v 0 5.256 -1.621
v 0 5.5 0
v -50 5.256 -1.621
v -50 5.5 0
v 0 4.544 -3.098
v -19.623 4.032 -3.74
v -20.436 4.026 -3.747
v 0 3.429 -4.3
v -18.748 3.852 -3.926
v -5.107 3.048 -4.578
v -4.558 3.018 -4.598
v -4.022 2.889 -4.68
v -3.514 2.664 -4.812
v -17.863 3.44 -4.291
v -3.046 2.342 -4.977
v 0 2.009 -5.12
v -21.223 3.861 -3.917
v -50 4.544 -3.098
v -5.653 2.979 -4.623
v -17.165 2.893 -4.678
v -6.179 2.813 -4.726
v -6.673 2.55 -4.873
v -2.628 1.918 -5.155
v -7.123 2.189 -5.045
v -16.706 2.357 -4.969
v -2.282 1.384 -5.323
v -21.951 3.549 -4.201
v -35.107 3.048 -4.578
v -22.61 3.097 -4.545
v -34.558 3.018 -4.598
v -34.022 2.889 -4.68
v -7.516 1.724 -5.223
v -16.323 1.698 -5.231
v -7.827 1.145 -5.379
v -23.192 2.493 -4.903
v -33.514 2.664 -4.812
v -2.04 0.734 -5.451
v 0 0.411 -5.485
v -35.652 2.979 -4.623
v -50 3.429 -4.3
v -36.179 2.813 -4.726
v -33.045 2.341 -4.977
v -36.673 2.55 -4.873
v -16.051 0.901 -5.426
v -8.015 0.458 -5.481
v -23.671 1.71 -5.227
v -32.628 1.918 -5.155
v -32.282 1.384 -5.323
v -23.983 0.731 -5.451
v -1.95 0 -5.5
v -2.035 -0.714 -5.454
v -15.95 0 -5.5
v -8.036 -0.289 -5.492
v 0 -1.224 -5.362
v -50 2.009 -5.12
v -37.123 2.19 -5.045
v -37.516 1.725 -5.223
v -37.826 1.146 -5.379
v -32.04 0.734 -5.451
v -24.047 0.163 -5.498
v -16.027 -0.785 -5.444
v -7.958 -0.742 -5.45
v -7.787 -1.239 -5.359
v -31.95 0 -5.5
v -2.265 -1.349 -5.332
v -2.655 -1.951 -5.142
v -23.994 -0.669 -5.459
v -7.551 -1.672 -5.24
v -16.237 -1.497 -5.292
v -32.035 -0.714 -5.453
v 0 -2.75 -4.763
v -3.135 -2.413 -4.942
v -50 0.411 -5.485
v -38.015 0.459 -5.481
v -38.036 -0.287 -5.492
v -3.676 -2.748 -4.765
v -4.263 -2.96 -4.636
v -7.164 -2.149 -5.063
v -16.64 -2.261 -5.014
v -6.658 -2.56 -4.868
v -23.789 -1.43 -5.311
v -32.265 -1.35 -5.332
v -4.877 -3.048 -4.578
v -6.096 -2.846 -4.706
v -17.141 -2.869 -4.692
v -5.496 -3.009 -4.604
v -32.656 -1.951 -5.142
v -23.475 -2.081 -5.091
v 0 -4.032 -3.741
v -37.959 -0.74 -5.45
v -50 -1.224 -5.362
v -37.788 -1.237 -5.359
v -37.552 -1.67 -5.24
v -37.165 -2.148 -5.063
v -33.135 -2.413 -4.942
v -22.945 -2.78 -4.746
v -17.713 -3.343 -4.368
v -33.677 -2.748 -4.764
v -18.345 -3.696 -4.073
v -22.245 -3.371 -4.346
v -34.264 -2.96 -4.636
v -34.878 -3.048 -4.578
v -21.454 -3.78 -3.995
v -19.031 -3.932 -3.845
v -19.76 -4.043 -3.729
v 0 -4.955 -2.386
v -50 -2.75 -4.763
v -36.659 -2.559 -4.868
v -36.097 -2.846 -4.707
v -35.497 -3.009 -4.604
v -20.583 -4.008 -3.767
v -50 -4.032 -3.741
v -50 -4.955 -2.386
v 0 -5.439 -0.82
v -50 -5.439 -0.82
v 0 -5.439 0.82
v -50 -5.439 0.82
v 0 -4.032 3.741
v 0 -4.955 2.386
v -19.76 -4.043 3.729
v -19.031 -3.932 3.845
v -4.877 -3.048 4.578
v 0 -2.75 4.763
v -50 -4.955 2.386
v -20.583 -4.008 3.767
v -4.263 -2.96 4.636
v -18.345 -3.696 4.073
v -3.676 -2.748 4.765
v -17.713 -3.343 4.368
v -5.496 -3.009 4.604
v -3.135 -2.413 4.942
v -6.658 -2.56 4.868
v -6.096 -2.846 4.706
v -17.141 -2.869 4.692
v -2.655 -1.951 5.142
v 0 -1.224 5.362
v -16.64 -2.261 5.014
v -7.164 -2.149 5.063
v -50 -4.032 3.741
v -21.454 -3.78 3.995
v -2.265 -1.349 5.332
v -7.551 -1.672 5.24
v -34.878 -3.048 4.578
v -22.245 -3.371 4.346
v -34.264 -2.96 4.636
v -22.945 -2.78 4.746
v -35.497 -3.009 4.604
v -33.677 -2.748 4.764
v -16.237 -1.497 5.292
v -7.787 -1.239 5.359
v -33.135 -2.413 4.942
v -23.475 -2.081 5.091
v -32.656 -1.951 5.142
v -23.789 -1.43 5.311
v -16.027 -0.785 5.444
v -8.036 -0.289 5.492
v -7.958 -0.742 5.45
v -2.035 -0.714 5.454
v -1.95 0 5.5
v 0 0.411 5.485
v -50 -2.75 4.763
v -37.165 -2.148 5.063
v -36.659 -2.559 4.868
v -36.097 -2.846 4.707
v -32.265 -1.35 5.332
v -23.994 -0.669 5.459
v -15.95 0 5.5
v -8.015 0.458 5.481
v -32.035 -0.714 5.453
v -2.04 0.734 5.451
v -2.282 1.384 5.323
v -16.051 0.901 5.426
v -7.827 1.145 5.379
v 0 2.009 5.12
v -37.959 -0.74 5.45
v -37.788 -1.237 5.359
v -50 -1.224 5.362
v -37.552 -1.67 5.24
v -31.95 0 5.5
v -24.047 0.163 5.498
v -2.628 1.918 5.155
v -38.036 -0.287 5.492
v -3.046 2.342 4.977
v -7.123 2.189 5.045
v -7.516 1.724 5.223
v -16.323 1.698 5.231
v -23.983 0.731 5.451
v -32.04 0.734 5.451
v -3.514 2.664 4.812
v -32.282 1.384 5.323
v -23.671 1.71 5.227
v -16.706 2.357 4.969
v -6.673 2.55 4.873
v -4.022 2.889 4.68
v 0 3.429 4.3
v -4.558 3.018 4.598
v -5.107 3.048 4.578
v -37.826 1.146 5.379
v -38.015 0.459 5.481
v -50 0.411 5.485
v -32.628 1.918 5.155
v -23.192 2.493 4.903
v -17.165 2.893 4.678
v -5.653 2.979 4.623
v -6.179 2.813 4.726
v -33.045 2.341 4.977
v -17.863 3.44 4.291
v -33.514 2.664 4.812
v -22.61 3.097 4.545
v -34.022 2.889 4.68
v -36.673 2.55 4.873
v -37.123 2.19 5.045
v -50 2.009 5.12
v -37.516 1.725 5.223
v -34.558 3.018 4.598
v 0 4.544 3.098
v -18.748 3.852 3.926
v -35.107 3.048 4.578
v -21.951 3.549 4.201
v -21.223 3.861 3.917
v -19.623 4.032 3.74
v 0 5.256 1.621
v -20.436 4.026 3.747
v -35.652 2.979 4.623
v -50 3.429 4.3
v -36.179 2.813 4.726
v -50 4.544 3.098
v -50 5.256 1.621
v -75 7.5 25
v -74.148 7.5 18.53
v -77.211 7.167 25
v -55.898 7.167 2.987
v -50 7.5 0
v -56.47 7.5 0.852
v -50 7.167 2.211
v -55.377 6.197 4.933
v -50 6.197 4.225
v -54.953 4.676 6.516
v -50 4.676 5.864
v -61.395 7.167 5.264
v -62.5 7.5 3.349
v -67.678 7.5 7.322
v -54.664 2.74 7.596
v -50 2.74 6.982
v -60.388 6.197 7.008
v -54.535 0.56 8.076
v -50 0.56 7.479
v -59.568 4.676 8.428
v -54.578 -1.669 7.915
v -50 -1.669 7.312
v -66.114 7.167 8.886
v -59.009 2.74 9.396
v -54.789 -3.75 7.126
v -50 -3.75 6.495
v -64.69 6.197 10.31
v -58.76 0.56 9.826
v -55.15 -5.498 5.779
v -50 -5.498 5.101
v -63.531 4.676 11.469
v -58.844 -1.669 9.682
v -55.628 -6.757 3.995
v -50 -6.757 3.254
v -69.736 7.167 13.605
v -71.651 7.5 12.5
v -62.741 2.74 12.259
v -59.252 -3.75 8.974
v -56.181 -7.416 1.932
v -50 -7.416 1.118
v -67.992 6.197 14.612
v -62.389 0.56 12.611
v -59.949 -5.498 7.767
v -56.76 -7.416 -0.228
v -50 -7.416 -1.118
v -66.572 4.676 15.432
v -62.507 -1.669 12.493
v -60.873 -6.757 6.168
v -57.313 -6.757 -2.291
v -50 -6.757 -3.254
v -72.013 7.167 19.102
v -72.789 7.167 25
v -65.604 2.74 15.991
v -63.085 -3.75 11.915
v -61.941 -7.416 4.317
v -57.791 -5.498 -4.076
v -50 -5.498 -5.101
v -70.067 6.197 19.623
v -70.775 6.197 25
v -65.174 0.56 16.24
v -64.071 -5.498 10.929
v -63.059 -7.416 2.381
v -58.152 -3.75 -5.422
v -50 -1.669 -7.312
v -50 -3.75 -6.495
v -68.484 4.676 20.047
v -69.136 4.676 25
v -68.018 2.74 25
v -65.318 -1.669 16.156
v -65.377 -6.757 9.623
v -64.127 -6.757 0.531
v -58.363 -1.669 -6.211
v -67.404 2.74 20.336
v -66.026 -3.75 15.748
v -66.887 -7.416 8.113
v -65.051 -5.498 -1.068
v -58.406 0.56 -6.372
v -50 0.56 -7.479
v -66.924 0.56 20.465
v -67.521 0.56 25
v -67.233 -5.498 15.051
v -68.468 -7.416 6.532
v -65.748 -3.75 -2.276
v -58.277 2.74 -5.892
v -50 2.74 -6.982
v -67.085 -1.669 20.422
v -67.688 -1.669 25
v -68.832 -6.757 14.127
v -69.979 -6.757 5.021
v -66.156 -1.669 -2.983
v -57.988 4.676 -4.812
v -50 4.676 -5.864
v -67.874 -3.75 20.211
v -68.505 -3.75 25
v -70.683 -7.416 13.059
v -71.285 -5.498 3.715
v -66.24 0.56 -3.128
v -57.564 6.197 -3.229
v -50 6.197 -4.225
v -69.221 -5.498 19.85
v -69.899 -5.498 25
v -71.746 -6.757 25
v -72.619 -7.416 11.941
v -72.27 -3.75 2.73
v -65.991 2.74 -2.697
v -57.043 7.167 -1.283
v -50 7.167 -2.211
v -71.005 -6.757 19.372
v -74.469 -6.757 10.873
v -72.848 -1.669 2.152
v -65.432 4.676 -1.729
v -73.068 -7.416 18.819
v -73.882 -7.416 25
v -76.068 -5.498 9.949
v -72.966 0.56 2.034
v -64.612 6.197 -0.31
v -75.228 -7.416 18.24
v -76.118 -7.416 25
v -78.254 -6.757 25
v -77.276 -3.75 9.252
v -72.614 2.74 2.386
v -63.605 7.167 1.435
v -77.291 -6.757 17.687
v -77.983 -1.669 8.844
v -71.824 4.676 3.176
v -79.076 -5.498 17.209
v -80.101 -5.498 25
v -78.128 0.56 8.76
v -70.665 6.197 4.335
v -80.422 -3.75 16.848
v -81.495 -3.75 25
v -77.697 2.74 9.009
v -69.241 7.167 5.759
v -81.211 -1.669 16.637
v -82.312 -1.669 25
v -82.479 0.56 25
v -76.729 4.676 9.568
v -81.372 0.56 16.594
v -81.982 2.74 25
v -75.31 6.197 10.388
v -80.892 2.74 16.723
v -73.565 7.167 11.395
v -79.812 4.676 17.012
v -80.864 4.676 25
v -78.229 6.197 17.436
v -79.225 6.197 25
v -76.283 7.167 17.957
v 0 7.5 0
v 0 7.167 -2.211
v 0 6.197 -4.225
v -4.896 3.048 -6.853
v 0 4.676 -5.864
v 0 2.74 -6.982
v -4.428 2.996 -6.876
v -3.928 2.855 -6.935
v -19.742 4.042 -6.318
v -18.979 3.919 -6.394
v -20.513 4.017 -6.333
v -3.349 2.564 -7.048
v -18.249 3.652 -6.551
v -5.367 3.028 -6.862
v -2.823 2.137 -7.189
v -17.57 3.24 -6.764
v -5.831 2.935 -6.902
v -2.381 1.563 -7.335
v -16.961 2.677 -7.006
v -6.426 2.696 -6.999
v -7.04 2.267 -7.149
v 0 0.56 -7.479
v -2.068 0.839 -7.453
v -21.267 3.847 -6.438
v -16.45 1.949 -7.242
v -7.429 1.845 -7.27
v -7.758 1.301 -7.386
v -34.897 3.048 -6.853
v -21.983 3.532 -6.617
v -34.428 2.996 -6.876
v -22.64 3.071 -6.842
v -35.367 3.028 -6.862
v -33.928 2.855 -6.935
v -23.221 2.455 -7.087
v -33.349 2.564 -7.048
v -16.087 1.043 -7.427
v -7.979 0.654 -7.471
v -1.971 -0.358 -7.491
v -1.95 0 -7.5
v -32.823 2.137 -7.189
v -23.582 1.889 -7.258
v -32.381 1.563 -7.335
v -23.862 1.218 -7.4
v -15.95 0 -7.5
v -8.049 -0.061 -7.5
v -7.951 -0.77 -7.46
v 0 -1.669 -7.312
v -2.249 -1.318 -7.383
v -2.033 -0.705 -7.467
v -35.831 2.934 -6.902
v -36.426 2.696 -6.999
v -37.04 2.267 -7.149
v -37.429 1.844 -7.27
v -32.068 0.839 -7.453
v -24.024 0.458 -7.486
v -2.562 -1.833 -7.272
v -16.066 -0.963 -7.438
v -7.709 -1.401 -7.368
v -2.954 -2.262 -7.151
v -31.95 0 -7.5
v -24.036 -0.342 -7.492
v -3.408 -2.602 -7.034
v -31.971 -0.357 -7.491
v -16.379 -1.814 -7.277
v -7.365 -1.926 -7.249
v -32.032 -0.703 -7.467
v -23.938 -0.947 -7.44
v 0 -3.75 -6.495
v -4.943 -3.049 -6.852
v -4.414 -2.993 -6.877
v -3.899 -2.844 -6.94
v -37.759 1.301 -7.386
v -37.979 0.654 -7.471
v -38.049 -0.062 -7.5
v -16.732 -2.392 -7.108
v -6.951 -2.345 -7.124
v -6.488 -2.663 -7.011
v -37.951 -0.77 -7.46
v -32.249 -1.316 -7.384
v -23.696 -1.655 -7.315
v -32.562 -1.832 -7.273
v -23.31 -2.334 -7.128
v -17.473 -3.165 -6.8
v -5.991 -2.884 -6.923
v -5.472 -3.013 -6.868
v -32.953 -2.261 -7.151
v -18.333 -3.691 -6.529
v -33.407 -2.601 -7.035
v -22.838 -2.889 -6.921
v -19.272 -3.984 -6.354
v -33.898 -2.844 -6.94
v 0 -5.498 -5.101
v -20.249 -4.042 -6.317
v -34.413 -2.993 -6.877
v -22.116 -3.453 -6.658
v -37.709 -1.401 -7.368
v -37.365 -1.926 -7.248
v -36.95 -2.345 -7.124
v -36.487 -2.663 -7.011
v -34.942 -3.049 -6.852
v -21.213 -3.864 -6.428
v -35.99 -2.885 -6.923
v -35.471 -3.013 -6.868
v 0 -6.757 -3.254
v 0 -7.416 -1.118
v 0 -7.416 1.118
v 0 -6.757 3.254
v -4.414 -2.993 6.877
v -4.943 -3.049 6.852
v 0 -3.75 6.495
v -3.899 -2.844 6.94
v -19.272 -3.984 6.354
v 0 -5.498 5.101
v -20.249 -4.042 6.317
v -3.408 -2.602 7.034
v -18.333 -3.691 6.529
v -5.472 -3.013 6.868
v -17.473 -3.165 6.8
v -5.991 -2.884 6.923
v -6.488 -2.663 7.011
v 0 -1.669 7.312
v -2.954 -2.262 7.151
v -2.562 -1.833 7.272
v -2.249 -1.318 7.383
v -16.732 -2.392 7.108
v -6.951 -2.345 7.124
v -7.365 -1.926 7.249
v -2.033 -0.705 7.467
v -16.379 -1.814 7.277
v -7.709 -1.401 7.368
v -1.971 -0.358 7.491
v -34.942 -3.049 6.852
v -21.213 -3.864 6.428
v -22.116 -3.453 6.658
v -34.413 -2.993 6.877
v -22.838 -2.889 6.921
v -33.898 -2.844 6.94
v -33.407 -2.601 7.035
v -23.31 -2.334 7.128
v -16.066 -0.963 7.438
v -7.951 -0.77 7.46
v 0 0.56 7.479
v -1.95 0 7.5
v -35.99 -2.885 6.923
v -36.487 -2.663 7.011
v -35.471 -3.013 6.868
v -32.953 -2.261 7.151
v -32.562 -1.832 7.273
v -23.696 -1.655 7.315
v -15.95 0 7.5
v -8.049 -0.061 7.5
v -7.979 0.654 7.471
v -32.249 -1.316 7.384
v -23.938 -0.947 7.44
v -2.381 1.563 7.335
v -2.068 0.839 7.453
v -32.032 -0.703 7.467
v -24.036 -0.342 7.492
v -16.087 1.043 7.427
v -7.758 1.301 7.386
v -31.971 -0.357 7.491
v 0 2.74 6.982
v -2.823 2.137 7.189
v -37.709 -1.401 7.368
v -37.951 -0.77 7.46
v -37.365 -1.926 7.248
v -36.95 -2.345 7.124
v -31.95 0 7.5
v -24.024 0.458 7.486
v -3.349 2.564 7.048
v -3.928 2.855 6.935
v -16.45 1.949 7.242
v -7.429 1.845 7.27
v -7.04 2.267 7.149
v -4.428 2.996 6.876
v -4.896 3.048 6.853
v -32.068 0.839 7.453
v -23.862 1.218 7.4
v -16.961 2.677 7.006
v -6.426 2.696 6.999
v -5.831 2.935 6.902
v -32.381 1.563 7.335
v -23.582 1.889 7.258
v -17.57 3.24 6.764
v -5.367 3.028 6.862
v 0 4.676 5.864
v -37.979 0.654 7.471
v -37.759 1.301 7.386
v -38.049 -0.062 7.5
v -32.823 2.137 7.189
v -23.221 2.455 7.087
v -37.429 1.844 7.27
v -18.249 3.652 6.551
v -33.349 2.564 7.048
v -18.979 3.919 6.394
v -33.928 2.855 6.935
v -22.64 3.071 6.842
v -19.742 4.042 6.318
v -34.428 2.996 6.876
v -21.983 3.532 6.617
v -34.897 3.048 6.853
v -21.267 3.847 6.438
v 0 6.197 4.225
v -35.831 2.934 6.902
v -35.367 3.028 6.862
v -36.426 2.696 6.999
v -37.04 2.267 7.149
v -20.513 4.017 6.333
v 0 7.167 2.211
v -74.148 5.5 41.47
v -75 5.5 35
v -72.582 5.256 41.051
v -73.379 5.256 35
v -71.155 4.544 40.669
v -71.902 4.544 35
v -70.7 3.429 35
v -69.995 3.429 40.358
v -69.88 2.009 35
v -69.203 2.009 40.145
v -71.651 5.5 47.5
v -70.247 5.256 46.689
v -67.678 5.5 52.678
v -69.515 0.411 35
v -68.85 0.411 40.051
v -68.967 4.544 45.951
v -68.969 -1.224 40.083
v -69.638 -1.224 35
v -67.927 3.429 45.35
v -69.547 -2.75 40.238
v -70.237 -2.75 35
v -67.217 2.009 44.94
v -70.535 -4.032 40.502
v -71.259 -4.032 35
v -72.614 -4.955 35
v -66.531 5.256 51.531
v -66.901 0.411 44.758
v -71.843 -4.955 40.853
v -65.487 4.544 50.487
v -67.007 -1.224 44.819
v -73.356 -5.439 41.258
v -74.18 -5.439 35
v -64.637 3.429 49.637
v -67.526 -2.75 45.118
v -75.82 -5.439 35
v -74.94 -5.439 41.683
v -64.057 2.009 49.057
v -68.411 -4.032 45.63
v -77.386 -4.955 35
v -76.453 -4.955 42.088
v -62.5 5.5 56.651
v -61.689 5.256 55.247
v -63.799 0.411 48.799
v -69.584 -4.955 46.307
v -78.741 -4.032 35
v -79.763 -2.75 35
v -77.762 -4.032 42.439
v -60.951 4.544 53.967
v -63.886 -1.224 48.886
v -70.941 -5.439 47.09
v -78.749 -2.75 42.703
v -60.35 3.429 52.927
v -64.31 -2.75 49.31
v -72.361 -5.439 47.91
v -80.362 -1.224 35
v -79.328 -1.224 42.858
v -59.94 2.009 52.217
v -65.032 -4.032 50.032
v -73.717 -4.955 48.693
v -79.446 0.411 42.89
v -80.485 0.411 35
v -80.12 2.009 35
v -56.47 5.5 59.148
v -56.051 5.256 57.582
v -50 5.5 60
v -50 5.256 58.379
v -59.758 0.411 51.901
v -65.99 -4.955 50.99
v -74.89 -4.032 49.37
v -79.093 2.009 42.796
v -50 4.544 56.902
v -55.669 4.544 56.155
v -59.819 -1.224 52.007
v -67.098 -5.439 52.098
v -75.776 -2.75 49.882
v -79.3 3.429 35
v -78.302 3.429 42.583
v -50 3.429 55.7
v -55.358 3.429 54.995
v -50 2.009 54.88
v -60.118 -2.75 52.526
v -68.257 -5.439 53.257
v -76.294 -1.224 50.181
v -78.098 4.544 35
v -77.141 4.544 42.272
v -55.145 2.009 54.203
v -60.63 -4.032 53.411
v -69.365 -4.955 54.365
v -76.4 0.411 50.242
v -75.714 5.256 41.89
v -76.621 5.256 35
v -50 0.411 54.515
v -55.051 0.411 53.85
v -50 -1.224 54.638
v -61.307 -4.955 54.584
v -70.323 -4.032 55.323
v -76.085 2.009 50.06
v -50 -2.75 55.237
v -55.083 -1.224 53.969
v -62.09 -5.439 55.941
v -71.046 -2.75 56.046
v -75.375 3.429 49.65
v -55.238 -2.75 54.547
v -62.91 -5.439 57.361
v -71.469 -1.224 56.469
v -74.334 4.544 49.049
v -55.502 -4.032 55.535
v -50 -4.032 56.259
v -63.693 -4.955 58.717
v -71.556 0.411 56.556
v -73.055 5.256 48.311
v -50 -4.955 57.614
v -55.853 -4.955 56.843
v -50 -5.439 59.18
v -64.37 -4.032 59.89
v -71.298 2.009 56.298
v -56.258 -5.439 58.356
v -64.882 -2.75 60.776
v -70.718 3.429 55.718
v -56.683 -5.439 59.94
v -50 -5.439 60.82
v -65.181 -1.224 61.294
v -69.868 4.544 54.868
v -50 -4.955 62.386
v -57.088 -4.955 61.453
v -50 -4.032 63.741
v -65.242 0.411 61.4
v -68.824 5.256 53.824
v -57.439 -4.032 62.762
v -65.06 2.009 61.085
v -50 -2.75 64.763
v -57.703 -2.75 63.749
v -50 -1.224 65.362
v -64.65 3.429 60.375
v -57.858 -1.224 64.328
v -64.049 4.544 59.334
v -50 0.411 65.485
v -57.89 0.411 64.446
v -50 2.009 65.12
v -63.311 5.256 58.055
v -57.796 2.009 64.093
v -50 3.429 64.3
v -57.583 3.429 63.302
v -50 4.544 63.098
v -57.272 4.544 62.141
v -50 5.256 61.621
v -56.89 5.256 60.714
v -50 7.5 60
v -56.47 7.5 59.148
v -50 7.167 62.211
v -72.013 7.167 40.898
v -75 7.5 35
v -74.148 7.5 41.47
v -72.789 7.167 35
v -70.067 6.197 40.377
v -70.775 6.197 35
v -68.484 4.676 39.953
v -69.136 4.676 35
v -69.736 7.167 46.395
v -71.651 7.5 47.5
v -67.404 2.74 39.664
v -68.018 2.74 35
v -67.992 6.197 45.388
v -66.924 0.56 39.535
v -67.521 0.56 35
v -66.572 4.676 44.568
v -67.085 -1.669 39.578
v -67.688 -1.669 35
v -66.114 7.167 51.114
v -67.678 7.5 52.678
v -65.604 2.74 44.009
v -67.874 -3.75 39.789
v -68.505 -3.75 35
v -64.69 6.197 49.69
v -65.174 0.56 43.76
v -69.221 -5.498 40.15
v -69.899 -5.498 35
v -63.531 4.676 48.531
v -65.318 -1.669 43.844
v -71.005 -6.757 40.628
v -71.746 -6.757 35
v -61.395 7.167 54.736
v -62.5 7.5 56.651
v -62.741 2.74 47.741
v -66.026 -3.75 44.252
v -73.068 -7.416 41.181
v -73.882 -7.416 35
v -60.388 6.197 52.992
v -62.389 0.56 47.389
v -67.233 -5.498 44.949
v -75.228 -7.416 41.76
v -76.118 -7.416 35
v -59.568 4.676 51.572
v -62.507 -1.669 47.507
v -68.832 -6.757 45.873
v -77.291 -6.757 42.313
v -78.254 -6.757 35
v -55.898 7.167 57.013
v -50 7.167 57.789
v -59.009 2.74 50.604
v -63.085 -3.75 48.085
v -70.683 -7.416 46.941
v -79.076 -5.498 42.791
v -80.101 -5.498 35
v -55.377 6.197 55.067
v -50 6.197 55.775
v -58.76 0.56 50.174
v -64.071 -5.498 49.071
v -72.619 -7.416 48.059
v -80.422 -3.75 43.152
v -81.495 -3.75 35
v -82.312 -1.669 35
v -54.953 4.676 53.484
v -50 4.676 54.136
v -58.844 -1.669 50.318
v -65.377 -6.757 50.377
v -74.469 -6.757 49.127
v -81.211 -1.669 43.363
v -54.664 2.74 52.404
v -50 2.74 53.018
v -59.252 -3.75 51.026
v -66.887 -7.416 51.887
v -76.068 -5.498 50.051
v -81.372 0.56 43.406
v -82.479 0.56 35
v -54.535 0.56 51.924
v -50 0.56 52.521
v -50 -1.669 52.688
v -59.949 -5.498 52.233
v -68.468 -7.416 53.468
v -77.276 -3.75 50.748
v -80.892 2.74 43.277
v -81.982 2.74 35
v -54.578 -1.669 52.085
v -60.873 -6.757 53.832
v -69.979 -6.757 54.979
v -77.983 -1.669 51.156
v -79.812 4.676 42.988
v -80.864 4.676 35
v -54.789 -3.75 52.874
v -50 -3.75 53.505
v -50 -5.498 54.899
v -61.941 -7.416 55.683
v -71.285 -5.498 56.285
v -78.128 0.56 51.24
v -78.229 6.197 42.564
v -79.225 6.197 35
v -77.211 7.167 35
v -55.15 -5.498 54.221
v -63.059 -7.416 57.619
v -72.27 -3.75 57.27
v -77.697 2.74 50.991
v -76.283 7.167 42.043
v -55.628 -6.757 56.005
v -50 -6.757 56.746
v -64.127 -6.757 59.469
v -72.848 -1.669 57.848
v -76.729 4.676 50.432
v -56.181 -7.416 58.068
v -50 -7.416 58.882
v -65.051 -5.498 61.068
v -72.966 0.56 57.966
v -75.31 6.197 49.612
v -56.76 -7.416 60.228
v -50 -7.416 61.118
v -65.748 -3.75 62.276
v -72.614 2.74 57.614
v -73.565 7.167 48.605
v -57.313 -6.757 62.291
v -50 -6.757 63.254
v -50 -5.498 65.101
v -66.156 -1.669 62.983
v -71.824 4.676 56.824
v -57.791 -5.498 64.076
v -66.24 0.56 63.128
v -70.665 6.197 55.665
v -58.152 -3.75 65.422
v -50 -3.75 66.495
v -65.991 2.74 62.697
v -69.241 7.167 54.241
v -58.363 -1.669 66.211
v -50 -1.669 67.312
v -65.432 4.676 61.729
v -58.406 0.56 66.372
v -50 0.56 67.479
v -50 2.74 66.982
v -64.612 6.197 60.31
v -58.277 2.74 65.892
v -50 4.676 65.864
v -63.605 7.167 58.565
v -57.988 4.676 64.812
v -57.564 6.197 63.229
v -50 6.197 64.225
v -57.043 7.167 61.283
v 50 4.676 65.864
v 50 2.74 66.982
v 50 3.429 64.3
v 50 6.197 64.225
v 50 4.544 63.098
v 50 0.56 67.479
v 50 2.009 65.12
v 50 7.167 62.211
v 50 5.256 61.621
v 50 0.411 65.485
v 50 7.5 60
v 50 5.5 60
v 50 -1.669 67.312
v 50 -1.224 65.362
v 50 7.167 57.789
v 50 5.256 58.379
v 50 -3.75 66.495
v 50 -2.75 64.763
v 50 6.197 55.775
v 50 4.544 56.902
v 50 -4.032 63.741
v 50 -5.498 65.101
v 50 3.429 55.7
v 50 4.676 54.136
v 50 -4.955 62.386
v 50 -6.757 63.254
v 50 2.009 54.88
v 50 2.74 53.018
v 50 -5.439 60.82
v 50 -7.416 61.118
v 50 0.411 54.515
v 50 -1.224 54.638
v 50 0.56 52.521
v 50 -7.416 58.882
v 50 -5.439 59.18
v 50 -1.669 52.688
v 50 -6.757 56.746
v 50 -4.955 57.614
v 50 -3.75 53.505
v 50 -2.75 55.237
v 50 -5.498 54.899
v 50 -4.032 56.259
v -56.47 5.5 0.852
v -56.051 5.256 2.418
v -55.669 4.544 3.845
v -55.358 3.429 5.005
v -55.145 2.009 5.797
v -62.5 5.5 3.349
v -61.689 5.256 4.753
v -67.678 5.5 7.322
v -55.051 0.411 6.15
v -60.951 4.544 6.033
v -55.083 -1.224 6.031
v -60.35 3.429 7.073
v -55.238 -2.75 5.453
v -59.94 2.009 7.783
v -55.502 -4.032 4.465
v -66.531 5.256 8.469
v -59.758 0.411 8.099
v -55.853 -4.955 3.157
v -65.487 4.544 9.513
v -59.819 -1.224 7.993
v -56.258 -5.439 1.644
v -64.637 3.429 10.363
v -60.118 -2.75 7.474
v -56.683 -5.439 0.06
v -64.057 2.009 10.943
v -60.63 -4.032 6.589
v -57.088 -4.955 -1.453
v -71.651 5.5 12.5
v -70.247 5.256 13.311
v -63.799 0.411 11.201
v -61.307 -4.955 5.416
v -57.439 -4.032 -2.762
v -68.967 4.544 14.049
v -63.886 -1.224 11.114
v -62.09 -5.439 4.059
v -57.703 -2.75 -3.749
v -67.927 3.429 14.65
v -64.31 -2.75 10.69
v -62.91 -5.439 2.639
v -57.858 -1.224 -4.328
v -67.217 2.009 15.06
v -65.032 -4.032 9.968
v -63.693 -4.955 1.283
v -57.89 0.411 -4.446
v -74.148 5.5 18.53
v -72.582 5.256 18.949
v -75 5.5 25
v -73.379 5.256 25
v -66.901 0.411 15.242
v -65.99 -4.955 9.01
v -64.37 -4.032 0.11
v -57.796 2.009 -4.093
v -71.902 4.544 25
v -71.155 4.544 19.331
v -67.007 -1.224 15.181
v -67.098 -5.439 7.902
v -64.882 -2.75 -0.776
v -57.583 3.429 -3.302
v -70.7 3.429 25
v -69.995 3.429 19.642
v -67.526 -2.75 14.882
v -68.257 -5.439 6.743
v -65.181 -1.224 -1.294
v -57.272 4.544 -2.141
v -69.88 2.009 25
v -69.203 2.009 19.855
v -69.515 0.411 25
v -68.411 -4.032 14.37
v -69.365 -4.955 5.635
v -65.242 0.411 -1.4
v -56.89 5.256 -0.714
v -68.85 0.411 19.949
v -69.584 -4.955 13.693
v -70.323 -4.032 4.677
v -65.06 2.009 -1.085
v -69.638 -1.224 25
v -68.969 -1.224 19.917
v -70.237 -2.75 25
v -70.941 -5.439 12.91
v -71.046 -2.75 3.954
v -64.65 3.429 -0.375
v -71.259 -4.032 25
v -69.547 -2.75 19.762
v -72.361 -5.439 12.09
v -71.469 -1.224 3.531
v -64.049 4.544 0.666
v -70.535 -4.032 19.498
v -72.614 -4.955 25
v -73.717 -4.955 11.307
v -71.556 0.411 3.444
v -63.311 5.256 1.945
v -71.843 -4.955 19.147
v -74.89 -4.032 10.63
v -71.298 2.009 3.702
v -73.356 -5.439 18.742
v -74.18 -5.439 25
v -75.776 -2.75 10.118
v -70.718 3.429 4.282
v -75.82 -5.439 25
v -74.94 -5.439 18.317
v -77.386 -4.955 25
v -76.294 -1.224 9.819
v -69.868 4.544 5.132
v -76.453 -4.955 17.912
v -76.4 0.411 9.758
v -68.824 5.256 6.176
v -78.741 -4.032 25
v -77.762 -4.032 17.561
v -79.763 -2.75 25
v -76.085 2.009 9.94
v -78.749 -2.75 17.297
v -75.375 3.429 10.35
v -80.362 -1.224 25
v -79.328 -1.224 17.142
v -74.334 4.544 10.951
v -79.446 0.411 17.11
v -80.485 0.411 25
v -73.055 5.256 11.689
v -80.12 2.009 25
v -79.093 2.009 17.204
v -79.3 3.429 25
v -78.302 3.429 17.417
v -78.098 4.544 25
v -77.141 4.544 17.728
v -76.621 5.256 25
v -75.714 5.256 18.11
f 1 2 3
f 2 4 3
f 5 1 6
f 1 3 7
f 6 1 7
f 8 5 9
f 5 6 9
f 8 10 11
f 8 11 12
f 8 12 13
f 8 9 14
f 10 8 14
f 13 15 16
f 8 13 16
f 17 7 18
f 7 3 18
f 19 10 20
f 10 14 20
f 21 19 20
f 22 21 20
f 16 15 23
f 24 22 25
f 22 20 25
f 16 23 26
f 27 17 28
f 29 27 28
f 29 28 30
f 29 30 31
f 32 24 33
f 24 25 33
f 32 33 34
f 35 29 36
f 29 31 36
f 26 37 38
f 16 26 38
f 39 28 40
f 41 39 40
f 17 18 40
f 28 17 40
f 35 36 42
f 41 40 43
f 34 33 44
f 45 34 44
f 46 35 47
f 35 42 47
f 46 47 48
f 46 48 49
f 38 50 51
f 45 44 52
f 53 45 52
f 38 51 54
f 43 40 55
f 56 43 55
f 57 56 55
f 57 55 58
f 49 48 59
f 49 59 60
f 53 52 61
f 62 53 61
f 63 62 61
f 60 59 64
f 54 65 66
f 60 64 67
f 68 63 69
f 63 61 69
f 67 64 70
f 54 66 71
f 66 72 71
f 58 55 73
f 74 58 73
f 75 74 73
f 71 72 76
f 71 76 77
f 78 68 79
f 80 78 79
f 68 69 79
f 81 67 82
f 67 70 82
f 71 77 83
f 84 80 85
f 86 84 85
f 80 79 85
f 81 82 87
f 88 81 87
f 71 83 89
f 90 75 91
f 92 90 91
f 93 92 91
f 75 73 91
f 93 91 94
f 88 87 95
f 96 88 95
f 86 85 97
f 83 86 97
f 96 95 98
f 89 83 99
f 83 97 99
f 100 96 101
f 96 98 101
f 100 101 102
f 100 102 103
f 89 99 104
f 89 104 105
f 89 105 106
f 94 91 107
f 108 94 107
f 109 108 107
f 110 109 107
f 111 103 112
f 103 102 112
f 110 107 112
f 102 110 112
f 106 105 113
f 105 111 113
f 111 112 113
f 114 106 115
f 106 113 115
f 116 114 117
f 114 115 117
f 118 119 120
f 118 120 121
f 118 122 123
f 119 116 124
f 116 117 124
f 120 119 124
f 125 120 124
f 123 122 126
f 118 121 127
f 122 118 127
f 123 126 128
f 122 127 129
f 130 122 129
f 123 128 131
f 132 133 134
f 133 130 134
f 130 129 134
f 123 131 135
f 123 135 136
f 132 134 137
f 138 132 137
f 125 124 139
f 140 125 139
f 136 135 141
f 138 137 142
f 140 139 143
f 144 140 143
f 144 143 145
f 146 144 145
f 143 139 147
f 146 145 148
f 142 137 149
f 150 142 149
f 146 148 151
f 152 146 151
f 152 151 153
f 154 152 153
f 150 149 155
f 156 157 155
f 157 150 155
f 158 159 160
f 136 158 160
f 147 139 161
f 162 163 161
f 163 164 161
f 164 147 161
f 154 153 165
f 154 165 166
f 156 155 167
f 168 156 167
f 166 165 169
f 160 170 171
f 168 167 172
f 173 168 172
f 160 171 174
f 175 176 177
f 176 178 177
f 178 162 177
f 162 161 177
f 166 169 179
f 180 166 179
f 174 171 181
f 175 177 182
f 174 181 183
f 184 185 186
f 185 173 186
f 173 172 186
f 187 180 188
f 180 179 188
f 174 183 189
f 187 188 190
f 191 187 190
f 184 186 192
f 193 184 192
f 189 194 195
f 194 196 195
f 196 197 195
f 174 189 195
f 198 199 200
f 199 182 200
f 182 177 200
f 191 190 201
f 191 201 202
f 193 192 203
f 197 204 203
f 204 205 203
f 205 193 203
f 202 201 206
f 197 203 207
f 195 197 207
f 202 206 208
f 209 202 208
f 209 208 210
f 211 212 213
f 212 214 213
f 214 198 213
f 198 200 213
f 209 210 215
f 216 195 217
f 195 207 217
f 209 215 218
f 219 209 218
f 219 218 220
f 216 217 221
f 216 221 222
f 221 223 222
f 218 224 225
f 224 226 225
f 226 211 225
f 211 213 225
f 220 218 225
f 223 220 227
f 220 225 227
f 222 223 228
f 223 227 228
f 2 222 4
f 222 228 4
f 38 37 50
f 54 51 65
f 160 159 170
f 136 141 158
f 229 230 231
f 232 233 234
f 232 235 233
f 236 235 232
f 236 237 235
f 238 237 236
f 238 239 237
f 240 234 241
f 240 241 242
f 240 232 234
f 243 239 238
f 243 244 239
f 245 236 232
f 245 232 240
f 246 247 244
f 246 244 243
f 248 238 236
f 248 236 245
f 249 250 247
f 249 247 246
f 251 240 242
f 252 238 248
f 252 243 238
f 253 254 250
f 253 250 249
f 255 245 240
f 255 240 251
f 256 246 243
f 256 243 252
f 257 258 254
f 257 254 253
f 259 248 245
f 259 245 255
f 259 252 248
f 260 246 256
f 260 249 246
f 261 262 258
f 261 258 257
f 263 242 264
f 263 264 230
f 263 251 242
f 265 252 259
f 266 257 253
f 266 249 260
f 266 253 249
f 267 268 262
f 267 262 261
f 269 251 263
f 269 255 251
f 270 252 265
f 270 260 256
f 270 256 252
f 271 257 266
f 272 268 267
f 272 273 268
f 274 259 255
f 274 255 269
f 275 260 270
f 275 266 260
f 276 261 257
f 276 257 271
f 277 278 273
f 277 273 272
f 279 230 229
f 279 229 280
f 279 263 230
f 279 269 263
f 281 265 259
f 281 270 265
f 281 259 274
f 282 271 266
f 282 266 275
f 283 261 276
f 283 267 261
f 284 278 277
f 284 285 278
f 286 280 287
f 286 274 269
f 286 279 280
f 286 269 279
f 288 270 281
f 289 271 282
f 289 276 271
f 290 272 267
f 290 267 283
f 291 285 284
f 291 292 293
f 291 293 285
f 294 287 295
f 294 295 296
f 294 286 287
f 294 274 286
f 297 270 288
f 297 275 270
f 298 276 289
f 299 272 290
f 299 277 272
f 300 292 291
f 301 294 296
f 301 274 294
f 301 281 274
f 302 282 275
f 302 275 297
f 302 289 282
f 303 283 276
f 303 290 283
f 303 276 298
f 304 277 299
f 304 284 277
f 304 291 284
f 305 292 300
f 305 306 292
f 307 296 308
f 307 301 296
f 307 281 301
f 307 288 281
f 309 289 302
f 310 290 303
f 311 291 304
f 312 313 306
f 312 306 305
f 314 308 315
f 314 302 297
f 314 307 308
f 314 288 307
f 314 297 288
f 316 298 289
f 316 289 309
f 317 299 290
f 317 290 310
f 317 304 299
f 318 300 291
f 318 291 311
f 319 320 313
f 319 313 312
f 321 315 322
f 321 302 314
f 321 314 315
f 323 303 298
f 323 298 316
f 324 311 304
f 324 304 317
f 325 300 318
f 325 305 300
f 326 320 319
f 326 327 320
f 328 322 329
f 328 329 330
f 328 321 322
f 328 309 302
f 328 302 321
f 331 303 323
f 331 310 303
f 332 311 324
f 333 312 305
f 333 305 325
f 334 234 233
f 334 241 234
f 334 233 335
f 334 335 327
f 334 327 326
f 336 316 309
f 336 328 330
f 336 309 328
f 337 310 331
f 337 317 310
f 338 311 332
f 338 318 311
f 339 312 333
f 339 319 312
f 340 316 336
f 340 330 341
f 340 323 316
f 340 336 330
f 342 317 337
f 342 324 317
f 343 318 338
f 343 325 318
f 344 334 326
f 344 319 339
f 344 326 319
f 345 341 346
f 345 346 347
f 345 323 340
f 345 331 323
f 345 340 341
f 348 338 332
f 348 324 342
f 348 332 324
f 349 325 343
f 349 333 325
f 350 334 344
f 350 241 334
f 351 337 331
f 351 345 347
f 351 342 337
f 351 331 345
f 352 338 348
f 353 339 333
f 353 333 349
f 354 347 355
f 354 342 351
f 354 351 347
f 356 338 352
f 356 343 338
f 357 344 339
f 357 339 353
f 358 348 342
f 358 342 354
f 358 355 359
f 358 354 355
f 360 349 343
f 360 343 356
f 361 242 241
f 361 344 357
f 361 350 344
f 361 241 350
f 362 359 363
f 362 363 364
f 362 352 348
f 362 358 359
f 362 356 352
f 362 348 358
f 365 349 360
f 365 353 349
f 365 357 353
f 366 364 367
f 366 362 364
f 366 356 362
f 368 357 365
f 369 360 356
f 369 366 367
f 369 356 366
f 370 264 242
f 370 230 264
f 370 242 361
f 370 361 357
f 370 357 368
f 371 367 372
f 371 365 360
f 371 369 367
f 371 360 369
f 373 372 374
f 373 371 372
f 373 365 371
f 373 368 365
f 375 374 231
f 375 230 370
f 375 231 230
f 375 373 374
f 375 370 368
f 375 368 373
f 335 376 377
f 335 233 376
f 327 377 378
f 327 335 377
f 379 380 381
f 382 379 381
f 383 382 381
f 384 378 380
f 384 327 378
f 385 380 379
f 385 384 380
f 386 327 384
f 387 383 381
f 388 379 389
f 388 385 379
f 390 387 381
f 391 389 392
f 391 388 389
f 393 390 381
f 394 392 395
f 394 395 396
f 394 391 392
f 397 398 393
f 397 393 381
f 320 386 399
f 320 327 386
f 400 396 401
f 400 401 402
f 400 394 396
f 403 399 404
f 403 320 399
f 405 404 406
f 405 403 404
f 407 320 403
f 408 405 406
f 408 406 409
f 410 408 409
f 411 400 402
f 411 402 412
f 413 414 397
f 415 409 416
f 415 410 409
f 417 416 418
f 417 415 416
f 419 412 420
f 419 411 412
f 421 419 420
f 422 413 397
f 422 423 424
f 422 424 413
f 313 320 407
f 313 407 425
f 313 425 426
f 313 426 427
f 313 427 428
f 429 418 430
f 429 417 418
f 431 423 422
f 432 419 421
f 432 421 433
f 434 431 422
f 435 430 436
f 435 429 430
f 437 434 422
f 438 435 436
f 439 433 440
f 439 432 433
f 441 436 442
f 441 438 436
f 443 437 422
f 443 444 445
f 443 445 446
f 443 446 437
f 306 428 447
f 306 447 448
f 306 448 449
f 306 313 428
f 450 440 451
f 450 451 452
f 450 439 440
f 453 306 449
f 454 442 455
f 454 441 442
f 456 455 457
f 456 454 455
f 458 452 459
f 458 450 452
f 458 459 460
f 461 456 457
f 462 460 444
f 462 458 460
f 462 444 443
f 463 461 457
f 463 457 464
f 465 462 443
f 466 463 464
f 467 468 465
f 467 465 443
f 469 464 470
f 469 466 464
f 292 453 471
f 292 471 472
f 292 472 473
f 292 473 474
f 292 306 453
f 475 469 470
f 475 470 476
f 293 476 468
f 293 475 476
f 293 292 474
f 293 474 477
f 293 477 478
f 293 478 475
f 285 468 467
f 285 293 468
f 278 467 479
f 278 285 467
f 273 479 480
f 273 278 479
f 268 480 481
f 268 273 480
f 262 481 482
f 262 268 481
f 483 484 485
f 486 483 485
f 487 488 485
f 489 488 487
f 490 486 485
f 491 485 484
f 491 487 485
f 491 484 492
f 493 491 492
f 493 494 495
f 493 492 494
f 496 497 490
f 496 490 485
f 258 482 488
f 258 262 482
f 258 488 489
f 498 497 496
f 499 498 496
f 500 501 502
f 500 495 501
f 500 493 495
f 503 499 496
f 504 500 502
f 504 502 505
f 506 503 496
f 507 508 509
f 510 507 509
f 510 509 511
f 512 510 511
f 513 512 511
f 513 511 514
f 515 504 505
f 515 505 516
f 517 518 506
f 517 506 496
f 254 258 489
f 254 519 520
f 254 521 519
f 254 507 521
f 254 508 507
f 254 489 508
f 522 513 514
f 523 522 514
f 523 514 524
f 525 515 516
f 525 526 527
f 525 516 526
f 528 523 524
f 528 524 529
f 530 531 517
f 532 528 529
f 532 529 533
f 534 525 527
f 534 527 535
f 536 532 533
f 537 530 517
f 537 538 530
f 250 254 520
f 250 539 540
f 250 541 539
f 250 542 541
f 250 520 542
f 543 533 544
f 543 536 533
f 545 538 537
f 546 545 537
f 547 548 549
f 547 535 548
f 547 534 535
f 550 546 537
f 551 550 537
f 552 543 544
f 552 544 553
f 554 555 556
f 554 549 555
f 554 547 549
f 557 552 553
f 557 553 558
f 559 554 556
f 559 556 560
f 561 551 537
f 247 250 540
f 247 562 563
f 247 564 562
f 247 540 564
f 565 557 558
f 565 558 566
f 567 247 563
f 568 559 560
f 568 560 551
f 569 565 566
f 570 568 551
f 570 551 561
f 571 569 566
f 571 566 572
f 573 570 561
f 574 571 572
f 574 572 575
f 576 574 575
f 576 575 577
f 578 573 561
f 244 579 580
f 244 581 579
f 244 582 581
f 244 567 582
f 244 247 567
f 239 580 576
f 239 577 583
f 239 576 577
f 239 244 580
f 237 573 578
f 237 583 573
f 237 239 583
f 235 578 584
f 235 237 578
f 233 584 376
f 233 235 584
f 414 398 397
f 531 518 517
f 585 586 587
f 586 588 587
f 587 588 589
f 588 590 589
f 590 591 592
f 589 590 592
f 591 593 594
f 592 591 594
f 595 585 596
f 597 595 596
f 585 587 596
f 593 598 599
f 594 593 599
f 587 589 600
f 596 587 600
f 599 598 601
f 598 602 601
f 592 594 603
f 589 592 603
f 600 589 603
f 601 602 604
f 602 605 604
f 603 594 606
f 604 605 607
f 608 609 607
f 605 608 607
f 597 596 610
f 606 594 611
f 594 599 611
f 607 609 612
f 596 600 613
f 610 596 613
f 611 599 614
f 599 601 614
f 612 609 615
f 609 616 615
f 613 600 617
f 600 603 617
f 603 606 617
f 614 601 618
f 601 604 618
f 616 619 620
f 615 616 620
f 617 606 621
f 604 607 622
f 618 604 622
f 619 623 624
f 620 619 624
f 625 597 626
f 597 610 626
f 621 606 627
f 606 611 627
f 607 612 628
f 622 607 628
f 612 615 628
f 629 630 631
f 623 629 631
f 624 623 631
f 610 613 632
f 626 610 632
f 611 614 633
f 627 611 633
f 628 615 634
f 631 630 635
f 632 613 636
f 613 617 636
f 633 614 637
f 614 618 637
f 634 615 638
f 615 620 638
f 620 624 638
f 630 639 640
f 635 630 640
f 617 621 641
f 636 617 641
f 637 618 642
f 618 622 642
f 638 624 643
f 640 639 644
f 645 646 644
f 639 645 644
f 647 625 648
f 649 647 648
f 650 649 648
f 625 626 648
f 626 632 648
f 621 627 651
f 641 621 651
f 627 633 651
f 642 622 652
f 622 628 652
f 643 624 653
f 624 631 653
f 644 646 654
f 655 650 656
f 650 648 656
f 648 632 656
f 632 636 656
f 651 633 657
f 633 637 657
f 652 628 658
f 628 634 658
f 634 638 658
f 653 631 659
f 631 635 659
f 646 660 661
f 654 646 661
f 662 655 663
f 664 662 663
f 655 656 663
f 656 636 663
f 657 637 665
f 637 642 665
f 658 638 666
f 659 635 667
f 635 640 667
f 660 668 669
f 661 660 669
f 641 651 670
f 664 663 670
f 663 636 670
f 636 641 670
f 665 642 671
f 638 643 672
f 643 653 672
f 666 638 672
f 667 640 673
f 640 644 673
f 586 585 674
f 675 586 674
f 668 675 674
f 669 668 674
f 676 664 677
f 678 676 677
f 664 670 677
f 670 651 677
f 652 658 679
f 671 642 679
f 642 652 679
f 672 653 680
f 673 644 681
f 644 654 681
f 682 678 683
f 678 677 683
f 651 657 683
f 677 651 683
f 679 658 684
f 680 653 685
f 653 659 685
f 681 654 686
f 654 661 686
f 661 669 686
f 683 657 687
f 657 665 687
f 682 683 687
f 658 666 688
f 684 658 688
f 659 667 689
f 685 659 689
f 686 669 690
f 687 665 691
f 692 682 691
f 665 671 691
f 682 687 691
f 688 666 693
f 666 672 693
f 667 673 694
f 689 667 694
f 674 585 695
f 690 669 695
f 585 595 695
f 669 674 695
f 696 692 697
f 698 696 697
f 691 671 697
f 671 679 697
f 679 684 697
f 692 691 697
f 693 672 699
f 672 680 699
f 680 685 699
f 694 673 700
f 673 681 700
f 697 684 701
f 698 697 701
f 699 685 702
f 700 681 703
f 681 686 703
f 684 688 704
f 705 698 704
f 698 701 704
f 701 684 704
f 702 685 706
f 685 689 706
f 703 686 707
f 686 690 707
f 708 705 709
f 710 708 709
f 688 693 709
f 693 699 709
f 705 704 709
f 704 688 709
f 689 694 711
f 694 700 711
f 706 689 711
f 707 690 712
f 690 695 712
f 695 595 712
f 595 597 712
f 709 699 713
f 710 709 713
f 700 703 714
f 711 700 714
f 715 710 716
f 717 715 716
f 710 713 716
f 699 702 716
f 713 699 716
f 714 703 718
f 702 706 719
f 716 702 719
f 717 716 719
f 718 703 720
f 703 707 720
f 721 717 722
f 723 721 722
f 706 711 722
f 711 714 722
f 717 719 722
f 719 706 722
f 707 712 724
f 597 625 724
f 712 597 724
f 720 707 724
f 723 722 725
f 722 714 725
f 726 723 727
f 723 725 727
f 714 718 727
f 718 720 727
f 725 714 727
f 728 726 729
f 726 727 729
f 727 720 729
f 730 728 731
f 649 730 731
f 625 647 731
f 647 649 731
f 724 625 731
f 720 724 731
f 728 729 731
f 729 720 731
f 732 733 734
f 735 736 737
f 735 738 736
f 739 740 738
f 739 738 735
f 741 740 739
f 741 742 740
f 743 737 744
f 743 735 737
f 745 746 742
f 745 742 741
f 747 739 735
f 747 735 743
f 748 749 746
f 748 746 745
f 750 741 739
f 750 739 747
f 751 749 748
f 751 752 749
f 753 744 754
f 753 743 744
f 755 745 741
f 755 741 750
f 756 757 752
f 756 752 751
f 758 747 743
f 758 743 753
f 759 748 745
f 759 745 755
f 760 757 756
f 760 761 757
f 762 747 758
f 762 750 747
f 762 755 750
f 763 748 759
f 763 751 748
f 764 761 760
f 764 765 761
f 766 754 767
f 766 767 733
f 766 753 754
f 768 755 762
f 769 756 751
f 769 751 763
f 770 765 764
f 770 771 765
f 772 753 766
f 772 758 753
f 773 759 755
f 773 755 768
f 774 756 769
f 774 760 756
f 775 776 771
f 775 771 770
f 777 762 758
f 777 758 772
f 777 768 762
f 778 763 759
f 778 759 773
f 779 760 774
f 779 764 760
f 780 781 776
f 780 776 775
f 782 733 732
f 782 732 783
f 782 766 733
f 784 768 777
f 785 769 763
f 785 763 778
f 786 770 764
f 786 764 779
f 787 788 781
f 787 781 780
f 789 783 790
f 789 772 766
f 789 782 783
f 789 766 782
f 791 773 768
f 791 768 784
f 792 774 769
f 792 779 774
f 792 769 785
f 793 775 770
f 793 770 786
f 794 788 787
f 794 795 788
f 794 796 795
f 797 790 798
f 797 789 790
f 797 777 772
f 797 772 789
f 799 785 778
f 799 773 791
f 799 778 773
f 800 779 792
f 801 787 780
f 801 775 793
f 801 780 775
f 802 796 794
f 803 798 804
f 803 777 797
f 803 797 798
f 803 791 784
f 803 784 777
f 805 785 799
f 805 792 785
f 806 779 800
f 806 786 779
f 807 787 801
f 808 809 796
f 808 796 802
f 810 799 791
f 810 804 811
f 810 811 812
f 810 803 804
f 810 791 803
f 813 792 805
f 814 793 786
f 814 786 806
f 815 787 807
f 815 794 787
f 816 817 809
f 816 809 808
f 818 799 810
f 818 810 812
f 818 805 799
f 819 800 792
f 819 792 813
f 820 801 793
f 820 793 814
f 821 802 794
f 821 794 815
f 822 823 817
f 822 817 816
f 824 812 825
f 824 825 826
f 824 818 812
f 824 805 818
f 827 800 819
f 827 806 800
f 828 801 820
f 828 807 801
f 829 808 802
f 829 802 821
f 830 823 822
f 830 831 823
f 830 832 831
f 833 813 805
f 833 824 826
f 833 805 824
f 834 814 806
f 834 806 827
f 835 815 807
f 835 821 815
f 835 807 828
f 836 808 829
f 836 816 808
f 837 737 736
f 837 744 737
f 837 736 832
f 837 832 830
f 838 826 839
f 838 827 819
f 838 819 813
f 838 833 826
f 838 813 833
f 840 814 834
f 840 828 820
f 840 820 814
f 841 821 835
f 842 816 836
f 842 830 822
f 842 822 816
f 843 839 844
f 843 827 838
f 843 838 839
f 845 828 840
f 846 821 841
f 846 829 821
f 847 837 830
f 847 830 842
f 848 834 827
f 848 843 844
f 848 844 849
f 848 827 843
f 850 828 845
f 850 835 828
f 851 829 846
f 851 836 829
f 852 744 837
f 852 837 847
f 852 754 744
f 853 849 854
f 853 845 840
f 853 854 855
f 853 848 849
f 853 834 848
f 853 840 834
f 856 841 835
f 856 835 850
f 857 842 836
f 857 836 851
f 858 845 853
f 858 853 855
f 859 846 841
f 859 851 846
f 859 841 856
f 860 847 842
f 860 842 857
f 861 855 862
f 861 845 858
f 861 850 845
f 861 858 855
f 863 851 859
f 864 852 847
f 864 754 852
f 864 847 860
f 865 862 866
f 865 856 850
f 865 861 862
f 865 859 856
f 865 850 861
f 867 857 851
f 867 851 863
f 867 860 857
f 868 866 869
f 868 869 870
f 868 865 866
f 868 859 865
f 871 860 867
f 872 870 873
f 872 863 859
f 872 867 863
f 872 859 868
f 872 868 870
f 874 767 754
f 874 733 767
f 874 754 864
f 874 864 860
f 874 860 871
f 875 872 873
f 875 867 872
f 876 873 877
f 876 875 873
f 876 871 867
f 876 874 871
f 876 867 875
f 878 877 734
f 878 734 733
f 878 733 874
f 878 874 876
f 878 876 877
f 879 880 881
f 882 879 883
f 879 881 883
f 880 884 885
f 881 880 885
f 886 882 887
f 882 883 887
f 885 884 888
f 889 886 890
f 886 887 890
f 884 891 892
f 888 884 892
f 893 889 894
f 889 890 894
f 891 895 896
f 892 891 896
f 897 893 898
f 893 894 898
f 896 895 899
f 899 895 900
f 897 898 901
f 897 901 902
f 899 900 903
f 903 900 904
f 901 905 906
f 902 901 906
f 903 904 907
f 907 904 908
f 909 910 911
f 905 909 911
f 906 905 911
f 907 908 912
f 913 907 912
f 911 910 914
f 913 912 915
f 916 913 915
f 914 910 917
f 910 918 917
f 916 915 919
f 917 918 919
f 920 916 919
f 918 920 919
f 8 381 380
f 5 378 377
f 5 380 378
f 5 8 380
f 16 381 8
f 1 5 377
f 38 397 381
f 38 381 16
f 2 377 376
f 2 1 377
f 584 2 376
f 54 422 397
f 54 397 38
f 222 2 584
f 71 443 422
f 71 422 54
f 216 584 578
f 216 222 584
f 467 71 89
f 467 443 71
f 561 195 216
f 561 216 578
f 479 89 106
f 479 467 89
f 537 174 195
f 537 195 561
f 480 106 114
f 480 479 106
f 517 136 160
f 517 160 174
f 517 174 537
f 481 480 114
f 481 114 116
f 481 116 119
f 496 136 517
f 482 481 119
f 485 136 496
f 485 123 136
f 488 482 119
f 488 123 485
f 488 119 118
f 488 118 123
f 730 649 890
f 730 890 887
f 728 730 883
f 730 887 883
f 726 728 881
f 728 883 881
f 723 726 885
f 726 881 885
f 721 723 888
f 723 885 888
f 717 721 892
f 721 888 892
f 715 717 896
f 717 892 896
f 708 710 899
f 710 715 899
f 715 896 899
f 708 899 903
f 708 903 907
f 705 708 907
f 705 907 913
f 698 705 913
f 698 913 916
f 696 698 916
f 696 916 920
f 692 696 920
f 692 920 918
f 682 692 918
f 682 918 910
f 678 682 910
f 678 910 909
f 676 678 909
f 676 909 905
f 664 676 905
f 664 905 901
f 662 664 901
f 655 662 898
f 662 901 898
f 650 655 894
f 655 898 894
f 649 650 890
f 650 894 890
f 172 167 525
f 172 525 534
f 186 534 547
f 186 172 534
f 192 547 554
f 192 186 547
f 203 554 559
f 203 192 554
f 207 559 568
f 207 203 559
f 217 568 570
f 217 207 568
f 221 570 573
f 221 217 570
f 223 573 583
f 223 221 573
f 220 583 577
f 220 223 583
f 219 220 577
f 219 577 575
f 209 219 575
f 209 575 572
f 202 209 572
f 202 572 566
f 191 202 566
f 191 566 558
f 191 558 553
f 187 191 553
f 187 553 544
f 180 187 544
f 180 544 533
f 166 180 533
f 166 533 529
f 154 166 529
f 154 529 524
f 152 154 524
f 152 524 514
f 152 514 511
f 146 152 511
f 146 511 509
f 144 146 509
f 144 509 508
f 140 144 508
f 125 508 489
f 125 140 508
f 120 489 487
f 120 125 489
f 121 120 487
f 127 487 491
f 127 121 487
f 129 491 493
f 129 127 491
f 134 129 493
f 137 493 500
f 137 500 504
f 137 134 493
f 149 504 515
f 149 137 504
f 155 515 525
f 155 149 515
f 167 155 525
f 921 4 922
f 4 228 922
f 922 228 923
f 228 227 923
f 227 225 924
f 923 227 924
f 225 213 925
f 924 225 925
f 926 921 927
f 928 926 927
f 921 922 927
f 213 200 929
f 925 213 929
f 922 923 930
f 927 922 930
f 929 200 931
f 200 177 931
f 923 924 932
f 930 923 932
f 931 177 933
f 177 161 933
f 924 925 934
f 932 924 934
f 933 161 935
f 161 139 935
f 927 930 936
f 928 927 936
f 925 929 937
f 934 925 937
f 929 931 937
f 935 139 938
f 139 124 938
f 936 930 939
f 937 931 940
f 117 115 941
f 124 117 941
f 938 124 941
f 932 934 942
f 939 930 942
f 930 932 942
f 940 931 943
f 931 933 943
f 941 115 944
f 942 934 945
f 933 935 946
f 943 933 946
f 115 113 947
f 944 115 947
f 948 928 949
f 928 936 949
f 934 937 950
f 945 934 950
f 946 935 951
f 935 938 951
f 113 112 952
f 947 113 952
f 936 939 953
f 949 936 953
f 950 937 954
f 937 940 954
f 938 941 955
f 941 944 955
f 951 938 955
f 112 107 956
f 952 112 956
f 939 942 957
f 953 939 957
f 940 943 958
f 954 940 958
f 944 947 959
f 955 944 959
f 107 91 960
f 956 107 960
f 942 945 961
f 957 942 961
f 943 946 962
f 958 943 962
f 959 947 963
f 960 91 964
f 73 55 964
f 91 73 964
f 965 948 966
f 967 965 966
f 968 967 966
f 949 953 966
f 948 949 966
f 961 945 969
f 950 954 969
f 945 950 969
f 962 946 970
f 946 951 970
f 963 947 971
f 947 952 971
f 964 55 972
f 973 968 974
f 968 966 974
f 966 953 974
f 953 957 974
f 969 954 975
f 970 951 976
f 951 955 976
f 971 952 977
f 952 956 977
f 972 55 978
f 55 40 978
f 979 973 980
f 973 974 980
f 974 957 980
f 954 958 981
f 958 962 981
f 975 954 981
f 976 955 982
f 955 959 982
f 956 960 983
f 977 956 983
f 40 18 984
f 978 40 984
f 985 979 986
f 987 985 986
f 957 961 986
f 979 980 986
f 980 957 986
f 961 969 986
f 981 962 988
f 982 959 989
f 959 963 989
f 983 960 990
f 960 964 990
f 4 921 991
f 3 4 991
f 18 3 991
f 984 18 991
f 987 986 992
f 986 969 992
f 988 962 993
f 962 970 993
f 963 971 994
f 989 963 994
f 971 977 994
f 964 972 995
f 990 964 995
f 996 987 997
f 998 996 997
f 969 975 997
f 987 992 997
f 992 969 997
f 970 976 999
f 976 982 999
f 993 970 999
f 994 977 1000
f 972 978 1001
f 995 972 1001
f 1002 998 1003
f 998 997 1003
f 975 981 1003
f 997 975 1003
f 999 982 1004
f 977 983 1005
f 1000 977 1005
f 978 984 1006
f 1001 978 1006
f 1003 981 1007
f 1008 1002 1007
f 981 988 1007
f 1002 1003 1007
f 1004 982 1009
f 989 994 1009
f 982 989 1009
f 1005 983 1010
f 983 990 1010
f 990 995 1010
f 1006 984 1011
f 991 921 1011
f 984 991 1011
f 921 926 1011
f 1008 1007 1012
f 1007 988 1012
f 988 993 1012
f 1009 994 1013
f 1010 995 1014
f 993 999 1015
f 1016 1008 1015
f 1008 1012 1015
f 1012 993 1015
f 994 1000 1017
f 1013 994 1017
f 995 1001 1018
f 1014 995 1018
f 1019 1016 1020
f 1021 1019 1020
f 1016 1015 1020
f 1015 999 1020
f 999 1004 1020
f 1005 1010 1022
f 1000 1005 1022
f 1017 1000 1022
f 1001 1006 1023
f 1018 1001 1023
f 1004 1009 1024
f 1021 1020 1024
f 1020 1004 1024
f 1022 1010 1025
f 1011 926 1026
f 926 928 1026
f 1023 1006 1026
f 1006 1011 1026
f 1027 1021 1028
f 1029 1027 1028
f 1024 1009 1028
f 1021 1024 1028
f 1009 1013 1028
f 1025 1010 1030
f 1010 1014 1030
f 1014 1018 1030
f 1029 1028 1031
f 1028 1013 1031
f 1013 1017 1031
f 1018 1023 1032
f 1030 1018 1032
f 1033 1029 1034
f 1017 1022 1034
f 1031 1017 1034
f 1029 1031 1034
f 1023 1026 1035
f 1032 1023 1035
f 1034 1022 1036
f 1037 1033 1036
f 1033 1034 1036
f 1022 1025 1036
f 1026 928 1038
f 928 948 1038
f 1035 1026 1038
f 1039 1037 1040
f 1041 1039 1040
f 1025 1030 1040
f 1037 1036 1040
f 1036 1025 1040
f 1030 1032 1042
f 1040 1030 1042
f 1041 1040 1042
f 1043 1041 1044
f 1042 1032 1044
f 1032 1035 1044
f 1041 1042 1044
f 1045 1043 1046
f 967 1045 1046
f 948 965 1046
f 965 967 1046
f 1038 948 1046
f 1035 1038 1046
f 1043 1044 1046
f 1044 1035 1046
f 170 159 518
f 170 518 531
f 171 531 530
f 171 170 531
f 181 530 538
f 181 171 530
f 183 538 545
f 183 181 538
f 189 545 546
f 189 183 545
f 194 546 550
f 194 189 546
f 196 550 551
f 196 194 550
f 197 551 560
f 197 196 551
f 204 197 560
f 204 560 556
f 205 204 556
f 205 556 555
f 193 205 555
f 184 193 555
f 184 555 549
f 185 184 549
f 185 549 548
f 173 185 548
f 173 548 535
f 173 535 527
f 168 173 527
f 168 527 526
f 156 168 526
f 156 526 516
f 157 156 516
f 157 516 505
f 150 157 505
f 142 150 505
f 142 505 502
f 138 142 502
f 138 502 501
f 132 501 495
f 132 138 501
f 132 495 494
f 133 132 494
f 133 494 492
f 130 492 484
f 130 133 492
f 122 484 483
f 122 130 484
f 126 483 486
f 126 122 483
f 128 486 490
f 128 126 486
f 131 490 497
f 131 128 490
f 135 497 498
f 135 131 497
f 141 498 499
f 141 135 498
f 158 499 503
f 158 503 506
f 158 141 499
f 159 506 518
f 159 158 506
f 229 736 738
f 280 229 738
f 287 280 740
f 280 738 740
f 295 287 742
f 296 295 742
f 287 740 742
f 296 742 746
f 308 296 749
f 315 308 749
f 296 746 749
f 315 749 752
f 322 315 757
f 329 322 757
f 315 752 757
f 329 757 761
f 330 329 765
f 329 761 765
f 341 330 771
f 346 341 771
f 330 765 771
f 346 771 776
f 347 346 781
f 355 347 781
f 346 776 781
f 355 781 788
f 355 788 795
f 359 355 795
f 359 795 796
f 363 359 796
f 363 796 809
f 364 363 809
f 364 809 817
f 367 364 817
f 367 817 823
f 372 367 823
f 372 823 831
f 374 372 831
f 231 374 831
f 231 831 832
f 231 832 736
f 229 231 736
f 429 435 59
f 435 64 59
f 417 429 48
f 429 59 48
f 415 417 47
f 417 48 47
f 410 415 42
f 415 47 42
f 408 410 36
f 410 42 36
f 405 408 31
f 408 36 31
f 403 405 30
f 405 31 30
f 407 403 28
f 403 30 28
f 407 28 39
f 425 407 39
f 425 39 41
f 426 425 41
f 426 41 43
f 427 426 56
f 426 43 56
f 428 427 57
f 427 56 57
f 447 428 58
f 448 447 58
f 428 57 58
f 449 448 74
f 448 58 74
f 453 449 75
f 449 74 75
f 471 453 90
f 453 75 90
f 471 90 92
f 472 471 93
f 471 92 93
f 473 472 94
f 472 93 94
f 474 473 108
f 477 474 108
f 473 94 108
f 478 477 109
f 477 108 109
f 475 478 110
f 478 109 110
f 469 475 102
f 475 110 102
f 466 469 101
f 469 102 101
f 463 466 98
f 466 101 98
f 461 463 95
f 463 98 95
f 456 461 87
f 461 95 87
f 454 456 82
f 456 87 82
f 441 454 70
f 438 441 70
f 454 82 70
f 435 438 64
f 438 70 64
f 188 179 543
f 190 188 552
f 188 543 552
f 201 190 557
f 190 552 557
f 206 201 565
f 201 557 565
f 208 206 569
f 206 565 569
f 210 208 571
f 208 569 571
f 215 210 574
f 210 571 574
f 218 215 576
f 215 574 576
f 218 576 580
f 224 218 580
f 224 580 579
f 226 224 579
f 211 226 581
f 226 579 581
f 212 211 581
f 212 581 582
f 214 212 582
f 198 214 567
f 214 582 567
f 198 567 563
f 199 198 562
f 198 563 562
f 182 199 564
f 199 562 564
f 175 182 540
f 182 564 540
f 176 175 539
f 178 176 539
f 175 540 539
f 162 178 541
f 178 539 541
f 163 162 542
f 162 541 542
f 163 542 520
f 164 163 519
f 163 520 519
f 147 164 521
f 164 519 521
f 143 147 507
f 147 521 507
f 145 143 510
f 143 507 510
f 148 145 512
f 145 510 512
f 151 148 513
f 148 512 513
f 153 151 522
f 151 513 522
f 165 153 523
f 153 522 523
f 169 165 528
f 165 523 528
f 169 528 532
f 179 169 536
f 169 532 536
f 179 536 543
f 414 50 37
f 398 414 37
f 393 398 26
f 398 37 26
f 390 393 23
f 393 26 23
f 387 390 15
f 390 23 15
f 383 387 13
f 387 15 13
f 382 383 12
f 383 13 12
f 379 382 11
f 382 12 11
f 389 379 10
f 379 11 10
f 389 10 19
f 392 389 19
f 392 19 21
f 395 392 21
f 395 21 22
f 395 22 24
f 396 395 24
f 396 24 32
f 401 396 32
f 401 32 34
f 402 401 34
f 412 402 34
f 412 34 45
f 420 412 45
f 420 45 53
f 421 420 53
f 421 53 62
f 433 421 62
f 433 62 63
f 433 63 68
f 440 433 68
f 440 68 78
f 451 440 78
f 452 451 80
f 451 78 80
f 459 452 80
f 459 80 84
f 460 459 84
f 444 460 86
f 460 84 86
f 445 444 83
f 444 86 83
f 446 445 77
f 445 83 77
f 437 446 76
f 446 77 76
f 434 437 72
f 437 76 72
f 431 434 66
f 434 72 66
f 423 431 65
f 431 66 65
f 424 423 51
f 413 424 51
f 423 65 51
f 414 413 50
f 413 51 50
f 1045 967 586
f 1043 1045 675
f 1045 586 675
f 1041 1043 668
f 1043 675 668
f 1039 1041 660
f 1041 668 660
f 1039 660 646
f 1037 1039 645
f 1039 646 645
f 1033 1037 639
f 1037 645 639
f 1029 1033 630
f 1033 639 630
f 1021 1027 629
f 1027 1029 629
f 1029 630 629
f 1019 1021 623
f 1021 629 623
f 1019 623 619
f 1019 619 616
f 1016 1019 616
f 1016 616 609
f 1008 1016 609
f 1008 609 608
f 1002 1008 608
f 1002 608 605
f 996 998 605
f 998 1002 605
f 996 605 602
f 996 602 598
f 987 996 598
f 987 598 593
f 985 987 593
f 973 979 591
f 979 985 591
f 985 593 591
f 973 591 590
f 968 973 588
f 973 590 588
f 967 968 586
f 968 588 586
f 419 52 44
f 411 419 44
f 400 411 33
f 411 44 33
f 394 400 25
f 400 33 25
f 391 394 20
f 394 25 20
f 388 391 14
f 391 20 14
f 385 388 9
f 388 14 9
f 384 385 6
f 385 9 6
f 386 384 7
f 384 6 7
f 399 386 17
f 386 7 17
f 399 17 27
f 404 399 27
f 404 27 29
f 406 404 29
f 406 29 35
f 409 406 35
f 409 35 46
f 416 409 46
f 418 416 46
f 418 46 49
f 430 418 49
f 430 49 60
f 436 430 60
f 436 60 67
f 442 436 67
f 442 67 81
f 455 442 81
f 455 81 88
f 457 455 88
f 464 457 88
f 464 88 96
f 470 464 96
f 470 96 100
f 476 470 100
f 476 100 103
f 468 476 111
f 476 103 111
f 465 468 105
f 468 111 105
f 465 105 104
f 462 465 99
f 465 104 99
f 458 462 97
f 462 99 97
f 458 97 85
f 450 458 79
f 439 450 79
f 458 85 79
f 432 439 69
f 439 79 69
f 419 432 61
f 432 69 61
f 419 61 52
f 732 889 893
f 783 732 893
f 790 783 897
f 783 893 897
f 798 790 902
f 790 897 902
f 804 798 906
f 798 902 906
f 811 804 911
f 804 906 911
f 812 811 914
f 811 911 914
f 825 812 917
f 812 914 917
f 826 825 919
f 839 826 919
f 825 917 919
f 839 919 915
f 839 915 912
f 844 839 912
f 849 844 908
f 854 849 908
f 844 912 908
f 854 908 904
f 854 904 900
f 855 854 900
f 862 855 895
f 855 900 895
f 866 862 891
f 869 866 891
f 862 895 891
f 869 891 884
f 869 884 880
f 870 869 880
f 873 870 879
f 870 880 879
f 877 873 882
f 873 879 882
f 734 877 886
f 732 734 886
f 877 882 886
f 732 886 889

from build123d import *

# Parameters (mm, degrees)
F0_R     = 7.5
F0_R_2   = 5.5
F3_R     = 4.05
F3_R_2   = 3.05
F4_DEPTH = 15


with BuildPart() as f2:
    # F2: sweep along a path in F1
    with BuildLine(Plane.XZ) as f2_path:
        Line((0, 0), (-50, 0))
        ThreePointArc((-50, 0), (-67.67767, 7.32233), (-75, 25))
        Line((-75, 25), (-75, 35))
        ThreePointArc((-75, 35), (-67.67767, 52.67767), (-50, 60))
        Line((-50, 60), (50, 60))
    # F0 (on Right) → F2 (sweep)
    with BuildSketch(Plane.YZ):
        Circle(F0_R)
        Circle(F0_R_2, mode=Mode.SUBTRACT)
    sweep(path=f2_path.line)


with BuildPart() as f4:
    # F3 (on Top) → F4 (new body, symmetric)
    with BuildSketch(Plane.XY):
        with Locations((-20, 0)):
            Circle(F3_R)
        with Locations((-5, 0)):
            Circle(F3_R_2)
        with Locations((-35, 0)):
            Circle(F3_R_2)
    extrude(amount=F4_DEPTH, both=True)


with BuildPart() as f2_1:
    add(f2.part)

    # F5: cut F4
    add(f4.part, mode=Mode.SUBTRACT)


solid = f2_1.part
